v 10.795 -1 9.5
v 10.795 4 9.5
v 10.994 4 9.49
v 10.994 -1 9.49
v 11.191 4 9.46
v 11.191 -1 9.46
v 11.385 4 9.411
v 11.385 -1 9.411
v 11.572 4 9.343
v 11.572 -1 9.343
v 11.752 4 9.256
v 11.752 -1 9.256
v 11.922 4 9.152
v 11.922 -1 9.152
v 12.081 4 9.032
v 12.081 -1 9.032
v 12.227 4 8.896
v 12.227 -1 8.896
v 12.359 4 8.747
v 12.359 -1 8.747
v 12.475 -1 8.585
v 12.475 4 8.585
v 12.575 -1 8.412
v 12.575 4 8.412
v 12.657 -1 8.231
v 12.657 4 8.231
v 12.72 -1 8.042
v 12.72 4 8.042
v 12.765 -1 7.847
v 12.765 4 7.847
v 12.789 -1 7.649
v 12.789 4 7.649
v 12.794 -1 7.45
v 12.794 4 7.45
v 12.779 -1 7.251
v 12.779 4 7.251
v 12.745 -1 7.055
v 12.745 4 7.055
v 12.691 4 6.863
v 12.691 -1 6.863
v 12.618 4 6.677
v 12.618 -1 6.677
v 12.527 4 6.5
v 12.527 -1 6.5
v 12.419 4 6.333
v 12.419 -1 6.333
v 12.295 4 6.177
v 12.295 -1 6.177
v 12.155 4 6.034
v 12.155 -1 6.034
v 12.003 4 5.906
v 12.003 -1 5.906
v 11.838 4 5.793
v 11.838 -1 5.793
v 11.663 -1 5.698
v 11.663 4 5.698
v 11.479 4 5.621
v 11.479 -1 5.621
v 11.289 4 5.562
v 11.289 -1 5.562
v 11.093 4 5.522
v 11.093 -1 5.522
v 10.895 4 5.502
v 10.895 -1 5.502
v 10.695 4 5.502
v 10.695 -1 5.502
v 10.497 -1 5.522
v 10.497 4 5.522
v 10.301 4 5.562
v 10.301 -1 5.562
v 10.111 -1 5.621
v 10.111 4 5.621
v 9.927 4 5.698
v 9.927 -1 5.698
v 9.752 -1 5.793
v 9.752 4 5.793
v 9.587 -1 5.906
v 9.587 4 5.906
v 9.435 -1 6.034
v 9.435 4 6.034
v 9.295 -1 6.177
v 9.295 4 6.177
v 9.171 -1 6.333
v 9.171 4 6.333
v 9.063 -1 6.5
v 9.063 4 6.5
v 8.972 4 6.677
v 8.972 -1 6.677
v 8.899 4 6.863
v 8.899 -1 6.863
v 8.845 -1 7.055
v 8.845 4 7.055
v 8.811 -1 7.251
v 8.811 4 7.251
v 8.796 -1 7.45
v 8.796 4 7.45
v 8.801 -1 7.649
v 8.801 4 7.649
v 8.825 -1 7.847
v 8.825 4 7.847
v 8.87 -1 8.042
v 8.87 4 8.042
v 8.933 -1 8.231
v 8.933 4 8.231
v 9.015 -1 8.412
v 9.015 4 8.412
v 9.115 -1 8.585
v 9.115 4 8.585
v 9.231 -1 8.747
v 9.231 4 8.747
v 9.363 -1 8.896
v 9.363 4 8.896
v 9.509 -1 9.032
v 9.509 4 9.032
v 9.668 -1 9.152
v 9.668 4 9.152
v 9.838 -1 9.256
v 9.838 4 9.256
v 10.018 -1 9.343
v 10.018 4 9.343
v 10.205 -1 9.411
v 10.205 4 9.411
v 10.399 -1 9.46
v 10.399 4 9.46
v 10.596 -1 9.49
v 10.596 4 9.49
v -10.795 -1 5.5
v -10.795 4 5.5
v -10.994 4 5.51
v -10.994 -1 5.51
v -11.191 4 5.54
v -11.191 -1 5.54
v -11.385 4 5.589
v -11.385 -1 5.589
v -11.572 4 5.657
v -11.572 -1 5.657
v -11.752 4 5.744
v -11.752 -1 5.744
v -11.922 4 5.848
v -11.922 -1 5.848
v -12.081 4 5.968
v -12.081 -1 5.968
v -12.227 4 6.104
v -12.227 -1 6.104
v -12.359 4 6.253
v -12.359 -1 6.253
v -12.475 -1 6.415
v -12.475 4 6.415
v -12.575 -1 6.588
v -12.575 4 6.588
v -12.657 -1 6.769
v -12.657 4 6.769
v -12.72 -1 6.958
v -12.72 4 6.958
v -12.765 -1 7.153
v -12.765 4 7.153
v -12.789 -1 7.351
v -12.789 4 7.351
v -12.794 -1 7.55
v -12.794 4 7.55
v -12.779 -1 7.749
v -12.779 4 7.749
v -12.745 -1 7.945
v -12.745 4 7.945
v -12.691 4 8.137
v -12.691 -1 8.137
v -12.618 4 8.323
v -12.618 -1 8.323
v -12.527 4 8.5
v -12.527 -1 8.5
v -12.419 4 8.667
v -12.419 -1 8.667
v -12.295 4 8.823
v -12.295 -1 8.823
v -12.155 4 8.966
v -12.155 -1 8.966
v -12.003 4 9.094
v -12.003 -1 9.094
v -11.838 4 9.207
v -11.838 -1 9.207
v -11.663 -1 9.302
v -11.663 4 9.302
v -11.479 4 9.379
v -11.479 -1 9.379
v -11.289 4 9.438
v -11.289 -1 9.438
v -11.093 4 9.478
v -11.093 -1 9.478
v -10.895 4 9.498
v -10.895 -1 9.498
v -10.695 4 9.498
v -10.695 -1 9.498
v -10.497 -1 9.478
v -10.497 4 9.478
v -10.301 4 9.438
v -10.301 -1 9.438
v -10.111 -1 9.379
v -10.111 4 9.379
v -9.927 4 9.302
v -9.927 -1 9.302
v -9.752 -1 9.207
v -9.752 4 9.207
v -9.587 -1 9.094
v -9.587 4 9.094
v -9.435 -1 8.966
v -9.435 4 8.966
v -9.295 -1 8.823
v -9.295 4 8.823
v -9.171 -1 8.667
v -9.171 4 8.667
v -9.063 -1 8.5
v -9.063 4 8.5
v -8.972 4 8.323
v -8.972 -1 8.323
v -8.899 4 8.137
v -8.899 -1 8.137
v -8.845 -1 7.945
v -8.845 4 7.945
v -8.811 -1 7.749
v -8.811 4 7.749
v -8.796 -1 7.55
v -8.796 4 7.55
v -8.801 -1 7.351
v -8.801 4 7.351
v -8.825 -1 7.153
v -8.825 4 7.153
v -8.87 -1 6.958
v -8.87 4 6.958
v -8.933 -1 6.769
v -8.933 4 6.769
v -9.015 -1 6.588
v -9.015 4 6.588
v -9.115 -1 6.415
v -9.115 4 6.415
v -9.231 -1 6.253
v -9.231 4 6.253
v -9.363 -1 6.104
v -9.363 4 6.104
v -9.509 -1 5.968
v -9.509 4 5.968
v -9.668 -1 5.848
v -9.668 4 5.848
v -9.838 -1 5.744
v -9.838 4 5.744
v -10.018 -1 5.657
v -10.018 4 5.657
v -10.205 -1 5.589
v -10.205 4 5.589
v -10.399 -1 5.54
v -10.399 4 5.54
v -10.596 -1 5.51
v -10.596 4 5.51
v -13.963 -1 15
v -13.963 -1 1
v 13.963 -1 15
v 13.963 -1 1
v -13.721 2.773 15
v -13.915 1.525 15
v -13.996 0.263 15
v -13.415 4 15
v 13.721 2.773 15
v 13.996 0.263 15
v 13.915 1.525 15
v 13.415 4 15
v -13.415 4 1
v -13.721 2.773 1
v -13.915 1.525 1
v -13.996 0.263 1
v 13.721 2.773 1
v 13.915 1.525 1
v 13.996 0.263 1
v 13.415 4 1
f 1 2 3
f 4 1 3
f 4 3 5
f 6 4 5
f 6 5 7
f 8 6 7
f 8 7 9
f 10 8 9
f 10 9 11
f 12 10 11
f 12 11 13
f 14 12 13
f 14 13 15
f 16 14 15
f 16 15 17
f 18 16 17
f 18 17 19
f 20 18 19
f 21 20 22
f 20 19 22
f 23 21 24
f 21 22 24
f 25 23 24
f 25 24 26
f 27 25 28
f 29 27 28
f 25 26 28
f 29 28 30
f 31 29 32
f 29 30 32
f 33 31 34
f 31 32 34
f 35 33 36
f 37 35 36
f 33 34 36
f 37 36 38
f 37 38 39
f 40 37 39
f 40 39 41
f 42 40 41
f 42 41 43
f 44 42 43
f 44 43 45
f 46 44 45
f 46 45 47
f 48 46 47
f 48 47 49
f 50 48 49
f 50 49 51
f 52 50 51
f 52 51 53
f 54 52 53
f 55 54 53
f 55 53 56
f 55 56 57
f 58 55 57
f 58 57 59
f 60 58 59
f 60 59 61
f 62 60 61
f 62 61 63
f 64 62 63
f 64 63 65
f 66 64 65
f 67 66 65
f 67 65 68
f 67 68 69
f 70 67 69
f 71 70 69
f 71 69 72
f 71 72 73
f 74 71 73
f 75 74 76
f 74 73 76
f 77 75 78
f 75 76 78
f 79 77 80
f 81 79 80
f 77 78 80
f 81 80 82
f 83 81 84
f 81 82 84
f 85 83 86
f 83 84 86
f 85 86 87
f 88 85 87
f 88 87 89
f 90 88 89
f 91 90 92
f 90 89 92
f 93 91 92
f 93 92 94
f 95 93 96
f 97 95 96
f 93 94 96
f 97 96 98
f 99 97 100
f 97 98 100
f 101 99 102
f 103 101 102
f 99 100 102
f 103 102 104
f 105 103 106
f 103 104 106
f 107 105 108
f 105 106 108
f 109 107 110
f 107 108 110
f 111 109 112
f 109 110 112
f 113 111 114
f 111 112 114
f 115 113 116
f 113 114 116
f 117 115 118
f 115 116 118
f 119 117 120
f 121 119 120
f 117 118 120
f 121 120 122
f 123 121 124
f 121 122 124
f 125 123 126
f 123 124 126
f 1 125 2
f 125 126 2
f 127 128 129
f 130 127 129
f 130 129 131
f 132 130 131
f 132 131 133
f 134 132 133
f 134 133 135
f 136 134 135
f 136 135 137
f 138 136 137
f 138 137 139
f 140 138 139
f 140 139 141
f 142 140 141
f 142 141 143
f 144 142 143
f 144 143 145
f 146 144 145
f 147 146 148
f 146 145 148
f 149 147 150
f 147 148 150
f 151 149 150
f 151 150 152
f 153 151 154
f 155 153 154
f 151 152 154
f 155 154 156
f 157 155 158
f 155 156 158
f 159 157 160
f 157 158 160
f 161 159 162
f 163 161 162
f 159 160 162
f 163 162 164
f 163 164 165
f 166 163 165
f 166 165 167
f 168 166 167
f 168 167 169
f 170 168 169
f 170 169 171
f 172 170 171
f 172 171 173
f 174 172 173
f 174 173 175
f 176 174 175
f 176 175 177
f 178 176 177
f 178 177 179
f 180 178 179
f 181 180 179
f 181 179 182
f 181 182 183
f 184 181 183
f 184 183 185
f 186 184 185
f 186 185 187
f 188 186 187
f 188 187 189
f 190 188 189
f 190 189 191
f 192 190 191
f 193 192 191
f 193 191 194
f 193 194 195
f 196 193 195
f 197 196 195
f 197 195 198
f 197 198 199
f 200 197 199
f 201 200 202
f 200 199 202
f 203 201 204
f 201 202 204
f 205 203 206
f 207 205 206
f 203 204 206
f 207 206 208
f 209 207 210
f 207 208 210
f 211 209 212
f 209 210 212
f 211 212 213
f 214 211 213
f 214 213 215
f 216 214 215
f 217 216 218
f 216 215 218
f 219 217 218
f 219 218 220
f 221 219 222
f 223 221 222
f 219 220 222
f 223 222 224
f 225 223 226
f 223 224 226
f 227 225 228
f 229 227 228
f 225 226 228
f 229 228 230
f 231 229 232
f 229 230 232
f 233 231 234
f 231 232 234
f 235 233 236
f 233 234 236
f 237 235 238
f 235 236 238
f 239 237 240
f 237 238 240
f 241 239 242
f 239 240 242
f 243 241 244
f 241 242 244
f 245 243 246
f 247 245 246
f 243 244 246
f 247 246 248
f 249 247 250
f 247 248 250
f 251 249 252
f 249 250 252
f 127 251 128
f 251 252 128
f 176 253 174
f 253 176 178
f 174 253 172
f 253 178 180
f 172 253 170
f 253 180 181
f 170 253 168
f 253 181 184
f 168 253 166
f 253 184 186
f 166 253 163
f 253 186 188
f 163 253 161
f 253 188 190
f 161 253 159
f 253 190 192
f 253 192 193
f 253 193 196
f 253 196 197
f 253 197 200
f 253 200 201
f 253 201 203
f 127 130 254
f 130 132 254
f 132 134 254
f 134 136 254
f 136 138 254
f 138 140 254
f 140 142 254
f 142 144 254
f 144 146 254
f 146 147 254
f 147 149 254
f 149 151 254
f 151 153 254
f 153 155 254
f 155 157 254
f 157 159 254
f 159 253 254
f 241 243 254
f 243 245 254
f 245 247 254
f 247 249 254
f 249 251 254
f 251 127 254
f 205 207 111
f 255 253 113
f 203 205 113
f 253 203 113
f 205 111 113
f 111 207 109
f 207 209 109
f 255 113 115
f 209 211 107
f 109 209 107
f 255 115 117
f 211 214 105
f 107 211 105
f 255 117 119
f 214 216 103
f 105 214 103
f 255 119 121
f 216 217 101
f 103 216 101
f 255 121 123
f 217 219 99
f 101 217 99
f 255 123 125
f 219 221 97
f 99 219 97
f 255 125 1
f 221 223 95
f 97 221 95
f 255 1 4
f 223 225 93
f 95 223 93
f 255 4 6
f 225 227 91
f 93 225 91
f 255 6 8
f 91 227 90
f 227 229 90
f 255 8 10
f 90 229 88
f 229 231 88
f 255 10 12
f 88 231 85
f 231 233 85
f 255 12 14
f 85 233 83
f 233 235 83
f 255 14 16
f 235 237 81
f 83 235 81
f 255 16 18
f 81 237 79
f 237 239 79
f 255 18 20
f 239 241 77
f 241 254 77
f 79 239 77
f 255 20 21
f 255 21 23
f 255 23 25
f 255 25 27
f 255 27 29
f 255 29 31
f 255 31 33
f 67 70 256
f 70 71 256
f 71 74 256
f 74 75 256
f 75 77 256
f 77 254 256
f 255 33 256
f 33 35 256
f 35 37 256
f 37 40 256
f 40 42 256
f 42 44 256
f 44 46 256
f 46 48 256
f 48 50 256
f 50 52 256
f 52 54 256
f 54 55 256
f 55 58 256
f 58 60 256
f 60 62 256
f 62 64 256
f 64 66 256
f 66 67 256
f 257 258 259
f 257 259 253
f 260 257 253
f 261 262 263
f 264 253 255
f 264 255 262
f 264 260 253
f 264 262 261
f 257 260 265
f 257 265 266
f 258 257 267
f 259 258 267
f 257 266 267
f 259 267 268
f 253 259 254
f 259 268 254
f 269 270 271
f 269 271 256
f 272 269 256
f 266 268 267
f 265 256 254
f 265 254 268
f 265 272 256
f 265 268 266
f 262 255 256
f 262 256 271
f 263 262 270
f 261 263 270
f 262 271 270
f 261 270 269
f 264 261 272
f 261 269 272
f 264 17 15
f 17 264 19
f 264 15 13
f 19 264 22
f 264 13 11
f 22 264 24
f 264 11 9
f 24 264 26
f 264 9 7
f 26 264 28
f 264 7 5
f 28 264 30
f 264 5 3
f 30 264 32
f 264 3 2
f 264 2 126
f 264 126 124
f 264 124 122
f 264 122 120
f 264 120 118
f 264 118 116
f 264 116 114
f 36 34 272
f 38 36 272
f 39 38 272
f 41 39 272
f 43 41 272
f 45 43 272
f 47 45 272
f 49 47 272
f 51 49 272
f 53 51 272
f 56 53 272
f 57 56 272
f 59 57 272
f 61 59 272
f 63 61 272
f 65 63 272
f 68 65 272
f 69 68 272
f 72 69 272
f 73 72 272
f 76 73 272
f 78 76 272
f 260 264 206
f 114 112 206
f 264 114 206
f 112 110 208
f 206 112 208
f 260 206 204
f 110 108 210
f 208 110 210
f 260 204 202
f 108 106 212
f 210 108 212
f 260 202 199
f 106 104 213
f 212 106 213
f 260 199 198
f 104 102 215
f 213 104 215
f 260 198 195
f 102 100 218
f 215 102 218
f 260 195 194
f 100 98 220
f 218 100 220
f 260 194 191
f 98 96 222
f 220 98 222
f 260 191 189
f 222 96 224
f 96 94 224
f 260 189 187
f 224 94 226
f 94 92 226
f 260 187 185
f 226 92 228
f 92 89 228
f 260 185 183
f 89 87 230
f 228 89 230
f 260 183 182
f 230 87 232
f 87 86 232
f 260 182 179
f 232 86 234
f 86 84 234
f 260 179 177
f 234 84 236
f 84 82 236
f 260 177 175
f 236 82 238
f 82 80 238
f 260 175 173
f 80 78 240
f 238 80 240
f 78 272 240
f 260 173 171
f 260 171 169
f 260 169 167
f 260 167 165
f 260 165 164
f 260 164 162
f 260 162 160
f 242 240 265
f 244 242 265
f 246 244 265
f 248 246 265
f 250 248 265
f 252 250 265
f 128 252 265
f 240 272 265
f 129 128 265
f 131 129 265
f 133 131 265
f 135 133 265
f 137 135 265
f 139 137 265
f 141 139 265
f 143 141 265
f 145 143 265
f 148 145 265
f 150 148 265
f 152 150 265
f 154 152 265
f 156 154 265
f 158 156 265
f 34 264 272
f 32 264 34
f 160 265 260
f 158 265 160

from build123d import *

# Parameters (mm, degrees)
BOSS_EXTRUDE1_DEPTH = 15
SKETCH3_R           = 2
CUT_EXTRUDE1_DEPTH  = 22.117601772
CUT_EXTRUDE3_DEPTH  = 1


with BuildPart() as part:
    # Sketch2 → Boss-Extrude1 (new body)
    with BuildSketch(Plane.XY):
        with BuildLine():
            Line((0, 3.99956576), (-13.41495138, 3.99956576))
            ThreePointArc((-13.41495138, 3.99956576), (-13.915210617, 1.524585285), (-13.962716312, -1))
            Line((-13.962716312, -1), (0, -1))
            Line((0, -1), (13.962716312, -1))
            ThreePointArc((13.962716312, -1), (13.915210617, 1.524585285), (13.41495138, 3.99956576))
            Line((13.41495138, 3.99956576), (0, 3.99956576))
        make_face()
    extrude(amount=BOSS_EXTRUDE1_DEPTH)

    # Sketch3 → Cut-Extrude1 (cut, through all)
    with BuildSketch(Plane(origin=(0, 3.99956576, 0), x_dir=(1, 0, 0), z_dir=(0, 1, 0))):
        with Locations(Location((10.795, -7.5, 0), (0, 0, 270))):
            Circle(SKETCH3_R)
        with Locations(Location((-10.795, -7.5, 0), (0, 0, 90))):
            Circle(SKETCH3_R)
    extrude(amount=-CUT_EXTRUDE1_DEPTH, mode=Mode.SUBTRACT)

    # Sketch4 → Cut-Extrude3 (cut)
    with BuildSketch(Plane.XY):
        with BuildLine():
            Line((13.962716312, -1), (-13.962716312, -1))
            ThreePointArc((-13.962716312, -1), (-13.915210617, 1.524585285), (-13.41495138, 3.99956576))
            Line((-13.41495138, 3.99956576), (0, 3.99956576))
            Line((0, 3.99956576), (13.41495138, 3.99956576))
            ThreePointArc((13.41495138, 3.99956576), (13.915210617, 1.524585285), (13.962716312, -1))
        make_face()
    extrude(amount=CUT_EXTRUDE3_DEPTH, mode=Mode.SUBTRACT)


solid = part.part
